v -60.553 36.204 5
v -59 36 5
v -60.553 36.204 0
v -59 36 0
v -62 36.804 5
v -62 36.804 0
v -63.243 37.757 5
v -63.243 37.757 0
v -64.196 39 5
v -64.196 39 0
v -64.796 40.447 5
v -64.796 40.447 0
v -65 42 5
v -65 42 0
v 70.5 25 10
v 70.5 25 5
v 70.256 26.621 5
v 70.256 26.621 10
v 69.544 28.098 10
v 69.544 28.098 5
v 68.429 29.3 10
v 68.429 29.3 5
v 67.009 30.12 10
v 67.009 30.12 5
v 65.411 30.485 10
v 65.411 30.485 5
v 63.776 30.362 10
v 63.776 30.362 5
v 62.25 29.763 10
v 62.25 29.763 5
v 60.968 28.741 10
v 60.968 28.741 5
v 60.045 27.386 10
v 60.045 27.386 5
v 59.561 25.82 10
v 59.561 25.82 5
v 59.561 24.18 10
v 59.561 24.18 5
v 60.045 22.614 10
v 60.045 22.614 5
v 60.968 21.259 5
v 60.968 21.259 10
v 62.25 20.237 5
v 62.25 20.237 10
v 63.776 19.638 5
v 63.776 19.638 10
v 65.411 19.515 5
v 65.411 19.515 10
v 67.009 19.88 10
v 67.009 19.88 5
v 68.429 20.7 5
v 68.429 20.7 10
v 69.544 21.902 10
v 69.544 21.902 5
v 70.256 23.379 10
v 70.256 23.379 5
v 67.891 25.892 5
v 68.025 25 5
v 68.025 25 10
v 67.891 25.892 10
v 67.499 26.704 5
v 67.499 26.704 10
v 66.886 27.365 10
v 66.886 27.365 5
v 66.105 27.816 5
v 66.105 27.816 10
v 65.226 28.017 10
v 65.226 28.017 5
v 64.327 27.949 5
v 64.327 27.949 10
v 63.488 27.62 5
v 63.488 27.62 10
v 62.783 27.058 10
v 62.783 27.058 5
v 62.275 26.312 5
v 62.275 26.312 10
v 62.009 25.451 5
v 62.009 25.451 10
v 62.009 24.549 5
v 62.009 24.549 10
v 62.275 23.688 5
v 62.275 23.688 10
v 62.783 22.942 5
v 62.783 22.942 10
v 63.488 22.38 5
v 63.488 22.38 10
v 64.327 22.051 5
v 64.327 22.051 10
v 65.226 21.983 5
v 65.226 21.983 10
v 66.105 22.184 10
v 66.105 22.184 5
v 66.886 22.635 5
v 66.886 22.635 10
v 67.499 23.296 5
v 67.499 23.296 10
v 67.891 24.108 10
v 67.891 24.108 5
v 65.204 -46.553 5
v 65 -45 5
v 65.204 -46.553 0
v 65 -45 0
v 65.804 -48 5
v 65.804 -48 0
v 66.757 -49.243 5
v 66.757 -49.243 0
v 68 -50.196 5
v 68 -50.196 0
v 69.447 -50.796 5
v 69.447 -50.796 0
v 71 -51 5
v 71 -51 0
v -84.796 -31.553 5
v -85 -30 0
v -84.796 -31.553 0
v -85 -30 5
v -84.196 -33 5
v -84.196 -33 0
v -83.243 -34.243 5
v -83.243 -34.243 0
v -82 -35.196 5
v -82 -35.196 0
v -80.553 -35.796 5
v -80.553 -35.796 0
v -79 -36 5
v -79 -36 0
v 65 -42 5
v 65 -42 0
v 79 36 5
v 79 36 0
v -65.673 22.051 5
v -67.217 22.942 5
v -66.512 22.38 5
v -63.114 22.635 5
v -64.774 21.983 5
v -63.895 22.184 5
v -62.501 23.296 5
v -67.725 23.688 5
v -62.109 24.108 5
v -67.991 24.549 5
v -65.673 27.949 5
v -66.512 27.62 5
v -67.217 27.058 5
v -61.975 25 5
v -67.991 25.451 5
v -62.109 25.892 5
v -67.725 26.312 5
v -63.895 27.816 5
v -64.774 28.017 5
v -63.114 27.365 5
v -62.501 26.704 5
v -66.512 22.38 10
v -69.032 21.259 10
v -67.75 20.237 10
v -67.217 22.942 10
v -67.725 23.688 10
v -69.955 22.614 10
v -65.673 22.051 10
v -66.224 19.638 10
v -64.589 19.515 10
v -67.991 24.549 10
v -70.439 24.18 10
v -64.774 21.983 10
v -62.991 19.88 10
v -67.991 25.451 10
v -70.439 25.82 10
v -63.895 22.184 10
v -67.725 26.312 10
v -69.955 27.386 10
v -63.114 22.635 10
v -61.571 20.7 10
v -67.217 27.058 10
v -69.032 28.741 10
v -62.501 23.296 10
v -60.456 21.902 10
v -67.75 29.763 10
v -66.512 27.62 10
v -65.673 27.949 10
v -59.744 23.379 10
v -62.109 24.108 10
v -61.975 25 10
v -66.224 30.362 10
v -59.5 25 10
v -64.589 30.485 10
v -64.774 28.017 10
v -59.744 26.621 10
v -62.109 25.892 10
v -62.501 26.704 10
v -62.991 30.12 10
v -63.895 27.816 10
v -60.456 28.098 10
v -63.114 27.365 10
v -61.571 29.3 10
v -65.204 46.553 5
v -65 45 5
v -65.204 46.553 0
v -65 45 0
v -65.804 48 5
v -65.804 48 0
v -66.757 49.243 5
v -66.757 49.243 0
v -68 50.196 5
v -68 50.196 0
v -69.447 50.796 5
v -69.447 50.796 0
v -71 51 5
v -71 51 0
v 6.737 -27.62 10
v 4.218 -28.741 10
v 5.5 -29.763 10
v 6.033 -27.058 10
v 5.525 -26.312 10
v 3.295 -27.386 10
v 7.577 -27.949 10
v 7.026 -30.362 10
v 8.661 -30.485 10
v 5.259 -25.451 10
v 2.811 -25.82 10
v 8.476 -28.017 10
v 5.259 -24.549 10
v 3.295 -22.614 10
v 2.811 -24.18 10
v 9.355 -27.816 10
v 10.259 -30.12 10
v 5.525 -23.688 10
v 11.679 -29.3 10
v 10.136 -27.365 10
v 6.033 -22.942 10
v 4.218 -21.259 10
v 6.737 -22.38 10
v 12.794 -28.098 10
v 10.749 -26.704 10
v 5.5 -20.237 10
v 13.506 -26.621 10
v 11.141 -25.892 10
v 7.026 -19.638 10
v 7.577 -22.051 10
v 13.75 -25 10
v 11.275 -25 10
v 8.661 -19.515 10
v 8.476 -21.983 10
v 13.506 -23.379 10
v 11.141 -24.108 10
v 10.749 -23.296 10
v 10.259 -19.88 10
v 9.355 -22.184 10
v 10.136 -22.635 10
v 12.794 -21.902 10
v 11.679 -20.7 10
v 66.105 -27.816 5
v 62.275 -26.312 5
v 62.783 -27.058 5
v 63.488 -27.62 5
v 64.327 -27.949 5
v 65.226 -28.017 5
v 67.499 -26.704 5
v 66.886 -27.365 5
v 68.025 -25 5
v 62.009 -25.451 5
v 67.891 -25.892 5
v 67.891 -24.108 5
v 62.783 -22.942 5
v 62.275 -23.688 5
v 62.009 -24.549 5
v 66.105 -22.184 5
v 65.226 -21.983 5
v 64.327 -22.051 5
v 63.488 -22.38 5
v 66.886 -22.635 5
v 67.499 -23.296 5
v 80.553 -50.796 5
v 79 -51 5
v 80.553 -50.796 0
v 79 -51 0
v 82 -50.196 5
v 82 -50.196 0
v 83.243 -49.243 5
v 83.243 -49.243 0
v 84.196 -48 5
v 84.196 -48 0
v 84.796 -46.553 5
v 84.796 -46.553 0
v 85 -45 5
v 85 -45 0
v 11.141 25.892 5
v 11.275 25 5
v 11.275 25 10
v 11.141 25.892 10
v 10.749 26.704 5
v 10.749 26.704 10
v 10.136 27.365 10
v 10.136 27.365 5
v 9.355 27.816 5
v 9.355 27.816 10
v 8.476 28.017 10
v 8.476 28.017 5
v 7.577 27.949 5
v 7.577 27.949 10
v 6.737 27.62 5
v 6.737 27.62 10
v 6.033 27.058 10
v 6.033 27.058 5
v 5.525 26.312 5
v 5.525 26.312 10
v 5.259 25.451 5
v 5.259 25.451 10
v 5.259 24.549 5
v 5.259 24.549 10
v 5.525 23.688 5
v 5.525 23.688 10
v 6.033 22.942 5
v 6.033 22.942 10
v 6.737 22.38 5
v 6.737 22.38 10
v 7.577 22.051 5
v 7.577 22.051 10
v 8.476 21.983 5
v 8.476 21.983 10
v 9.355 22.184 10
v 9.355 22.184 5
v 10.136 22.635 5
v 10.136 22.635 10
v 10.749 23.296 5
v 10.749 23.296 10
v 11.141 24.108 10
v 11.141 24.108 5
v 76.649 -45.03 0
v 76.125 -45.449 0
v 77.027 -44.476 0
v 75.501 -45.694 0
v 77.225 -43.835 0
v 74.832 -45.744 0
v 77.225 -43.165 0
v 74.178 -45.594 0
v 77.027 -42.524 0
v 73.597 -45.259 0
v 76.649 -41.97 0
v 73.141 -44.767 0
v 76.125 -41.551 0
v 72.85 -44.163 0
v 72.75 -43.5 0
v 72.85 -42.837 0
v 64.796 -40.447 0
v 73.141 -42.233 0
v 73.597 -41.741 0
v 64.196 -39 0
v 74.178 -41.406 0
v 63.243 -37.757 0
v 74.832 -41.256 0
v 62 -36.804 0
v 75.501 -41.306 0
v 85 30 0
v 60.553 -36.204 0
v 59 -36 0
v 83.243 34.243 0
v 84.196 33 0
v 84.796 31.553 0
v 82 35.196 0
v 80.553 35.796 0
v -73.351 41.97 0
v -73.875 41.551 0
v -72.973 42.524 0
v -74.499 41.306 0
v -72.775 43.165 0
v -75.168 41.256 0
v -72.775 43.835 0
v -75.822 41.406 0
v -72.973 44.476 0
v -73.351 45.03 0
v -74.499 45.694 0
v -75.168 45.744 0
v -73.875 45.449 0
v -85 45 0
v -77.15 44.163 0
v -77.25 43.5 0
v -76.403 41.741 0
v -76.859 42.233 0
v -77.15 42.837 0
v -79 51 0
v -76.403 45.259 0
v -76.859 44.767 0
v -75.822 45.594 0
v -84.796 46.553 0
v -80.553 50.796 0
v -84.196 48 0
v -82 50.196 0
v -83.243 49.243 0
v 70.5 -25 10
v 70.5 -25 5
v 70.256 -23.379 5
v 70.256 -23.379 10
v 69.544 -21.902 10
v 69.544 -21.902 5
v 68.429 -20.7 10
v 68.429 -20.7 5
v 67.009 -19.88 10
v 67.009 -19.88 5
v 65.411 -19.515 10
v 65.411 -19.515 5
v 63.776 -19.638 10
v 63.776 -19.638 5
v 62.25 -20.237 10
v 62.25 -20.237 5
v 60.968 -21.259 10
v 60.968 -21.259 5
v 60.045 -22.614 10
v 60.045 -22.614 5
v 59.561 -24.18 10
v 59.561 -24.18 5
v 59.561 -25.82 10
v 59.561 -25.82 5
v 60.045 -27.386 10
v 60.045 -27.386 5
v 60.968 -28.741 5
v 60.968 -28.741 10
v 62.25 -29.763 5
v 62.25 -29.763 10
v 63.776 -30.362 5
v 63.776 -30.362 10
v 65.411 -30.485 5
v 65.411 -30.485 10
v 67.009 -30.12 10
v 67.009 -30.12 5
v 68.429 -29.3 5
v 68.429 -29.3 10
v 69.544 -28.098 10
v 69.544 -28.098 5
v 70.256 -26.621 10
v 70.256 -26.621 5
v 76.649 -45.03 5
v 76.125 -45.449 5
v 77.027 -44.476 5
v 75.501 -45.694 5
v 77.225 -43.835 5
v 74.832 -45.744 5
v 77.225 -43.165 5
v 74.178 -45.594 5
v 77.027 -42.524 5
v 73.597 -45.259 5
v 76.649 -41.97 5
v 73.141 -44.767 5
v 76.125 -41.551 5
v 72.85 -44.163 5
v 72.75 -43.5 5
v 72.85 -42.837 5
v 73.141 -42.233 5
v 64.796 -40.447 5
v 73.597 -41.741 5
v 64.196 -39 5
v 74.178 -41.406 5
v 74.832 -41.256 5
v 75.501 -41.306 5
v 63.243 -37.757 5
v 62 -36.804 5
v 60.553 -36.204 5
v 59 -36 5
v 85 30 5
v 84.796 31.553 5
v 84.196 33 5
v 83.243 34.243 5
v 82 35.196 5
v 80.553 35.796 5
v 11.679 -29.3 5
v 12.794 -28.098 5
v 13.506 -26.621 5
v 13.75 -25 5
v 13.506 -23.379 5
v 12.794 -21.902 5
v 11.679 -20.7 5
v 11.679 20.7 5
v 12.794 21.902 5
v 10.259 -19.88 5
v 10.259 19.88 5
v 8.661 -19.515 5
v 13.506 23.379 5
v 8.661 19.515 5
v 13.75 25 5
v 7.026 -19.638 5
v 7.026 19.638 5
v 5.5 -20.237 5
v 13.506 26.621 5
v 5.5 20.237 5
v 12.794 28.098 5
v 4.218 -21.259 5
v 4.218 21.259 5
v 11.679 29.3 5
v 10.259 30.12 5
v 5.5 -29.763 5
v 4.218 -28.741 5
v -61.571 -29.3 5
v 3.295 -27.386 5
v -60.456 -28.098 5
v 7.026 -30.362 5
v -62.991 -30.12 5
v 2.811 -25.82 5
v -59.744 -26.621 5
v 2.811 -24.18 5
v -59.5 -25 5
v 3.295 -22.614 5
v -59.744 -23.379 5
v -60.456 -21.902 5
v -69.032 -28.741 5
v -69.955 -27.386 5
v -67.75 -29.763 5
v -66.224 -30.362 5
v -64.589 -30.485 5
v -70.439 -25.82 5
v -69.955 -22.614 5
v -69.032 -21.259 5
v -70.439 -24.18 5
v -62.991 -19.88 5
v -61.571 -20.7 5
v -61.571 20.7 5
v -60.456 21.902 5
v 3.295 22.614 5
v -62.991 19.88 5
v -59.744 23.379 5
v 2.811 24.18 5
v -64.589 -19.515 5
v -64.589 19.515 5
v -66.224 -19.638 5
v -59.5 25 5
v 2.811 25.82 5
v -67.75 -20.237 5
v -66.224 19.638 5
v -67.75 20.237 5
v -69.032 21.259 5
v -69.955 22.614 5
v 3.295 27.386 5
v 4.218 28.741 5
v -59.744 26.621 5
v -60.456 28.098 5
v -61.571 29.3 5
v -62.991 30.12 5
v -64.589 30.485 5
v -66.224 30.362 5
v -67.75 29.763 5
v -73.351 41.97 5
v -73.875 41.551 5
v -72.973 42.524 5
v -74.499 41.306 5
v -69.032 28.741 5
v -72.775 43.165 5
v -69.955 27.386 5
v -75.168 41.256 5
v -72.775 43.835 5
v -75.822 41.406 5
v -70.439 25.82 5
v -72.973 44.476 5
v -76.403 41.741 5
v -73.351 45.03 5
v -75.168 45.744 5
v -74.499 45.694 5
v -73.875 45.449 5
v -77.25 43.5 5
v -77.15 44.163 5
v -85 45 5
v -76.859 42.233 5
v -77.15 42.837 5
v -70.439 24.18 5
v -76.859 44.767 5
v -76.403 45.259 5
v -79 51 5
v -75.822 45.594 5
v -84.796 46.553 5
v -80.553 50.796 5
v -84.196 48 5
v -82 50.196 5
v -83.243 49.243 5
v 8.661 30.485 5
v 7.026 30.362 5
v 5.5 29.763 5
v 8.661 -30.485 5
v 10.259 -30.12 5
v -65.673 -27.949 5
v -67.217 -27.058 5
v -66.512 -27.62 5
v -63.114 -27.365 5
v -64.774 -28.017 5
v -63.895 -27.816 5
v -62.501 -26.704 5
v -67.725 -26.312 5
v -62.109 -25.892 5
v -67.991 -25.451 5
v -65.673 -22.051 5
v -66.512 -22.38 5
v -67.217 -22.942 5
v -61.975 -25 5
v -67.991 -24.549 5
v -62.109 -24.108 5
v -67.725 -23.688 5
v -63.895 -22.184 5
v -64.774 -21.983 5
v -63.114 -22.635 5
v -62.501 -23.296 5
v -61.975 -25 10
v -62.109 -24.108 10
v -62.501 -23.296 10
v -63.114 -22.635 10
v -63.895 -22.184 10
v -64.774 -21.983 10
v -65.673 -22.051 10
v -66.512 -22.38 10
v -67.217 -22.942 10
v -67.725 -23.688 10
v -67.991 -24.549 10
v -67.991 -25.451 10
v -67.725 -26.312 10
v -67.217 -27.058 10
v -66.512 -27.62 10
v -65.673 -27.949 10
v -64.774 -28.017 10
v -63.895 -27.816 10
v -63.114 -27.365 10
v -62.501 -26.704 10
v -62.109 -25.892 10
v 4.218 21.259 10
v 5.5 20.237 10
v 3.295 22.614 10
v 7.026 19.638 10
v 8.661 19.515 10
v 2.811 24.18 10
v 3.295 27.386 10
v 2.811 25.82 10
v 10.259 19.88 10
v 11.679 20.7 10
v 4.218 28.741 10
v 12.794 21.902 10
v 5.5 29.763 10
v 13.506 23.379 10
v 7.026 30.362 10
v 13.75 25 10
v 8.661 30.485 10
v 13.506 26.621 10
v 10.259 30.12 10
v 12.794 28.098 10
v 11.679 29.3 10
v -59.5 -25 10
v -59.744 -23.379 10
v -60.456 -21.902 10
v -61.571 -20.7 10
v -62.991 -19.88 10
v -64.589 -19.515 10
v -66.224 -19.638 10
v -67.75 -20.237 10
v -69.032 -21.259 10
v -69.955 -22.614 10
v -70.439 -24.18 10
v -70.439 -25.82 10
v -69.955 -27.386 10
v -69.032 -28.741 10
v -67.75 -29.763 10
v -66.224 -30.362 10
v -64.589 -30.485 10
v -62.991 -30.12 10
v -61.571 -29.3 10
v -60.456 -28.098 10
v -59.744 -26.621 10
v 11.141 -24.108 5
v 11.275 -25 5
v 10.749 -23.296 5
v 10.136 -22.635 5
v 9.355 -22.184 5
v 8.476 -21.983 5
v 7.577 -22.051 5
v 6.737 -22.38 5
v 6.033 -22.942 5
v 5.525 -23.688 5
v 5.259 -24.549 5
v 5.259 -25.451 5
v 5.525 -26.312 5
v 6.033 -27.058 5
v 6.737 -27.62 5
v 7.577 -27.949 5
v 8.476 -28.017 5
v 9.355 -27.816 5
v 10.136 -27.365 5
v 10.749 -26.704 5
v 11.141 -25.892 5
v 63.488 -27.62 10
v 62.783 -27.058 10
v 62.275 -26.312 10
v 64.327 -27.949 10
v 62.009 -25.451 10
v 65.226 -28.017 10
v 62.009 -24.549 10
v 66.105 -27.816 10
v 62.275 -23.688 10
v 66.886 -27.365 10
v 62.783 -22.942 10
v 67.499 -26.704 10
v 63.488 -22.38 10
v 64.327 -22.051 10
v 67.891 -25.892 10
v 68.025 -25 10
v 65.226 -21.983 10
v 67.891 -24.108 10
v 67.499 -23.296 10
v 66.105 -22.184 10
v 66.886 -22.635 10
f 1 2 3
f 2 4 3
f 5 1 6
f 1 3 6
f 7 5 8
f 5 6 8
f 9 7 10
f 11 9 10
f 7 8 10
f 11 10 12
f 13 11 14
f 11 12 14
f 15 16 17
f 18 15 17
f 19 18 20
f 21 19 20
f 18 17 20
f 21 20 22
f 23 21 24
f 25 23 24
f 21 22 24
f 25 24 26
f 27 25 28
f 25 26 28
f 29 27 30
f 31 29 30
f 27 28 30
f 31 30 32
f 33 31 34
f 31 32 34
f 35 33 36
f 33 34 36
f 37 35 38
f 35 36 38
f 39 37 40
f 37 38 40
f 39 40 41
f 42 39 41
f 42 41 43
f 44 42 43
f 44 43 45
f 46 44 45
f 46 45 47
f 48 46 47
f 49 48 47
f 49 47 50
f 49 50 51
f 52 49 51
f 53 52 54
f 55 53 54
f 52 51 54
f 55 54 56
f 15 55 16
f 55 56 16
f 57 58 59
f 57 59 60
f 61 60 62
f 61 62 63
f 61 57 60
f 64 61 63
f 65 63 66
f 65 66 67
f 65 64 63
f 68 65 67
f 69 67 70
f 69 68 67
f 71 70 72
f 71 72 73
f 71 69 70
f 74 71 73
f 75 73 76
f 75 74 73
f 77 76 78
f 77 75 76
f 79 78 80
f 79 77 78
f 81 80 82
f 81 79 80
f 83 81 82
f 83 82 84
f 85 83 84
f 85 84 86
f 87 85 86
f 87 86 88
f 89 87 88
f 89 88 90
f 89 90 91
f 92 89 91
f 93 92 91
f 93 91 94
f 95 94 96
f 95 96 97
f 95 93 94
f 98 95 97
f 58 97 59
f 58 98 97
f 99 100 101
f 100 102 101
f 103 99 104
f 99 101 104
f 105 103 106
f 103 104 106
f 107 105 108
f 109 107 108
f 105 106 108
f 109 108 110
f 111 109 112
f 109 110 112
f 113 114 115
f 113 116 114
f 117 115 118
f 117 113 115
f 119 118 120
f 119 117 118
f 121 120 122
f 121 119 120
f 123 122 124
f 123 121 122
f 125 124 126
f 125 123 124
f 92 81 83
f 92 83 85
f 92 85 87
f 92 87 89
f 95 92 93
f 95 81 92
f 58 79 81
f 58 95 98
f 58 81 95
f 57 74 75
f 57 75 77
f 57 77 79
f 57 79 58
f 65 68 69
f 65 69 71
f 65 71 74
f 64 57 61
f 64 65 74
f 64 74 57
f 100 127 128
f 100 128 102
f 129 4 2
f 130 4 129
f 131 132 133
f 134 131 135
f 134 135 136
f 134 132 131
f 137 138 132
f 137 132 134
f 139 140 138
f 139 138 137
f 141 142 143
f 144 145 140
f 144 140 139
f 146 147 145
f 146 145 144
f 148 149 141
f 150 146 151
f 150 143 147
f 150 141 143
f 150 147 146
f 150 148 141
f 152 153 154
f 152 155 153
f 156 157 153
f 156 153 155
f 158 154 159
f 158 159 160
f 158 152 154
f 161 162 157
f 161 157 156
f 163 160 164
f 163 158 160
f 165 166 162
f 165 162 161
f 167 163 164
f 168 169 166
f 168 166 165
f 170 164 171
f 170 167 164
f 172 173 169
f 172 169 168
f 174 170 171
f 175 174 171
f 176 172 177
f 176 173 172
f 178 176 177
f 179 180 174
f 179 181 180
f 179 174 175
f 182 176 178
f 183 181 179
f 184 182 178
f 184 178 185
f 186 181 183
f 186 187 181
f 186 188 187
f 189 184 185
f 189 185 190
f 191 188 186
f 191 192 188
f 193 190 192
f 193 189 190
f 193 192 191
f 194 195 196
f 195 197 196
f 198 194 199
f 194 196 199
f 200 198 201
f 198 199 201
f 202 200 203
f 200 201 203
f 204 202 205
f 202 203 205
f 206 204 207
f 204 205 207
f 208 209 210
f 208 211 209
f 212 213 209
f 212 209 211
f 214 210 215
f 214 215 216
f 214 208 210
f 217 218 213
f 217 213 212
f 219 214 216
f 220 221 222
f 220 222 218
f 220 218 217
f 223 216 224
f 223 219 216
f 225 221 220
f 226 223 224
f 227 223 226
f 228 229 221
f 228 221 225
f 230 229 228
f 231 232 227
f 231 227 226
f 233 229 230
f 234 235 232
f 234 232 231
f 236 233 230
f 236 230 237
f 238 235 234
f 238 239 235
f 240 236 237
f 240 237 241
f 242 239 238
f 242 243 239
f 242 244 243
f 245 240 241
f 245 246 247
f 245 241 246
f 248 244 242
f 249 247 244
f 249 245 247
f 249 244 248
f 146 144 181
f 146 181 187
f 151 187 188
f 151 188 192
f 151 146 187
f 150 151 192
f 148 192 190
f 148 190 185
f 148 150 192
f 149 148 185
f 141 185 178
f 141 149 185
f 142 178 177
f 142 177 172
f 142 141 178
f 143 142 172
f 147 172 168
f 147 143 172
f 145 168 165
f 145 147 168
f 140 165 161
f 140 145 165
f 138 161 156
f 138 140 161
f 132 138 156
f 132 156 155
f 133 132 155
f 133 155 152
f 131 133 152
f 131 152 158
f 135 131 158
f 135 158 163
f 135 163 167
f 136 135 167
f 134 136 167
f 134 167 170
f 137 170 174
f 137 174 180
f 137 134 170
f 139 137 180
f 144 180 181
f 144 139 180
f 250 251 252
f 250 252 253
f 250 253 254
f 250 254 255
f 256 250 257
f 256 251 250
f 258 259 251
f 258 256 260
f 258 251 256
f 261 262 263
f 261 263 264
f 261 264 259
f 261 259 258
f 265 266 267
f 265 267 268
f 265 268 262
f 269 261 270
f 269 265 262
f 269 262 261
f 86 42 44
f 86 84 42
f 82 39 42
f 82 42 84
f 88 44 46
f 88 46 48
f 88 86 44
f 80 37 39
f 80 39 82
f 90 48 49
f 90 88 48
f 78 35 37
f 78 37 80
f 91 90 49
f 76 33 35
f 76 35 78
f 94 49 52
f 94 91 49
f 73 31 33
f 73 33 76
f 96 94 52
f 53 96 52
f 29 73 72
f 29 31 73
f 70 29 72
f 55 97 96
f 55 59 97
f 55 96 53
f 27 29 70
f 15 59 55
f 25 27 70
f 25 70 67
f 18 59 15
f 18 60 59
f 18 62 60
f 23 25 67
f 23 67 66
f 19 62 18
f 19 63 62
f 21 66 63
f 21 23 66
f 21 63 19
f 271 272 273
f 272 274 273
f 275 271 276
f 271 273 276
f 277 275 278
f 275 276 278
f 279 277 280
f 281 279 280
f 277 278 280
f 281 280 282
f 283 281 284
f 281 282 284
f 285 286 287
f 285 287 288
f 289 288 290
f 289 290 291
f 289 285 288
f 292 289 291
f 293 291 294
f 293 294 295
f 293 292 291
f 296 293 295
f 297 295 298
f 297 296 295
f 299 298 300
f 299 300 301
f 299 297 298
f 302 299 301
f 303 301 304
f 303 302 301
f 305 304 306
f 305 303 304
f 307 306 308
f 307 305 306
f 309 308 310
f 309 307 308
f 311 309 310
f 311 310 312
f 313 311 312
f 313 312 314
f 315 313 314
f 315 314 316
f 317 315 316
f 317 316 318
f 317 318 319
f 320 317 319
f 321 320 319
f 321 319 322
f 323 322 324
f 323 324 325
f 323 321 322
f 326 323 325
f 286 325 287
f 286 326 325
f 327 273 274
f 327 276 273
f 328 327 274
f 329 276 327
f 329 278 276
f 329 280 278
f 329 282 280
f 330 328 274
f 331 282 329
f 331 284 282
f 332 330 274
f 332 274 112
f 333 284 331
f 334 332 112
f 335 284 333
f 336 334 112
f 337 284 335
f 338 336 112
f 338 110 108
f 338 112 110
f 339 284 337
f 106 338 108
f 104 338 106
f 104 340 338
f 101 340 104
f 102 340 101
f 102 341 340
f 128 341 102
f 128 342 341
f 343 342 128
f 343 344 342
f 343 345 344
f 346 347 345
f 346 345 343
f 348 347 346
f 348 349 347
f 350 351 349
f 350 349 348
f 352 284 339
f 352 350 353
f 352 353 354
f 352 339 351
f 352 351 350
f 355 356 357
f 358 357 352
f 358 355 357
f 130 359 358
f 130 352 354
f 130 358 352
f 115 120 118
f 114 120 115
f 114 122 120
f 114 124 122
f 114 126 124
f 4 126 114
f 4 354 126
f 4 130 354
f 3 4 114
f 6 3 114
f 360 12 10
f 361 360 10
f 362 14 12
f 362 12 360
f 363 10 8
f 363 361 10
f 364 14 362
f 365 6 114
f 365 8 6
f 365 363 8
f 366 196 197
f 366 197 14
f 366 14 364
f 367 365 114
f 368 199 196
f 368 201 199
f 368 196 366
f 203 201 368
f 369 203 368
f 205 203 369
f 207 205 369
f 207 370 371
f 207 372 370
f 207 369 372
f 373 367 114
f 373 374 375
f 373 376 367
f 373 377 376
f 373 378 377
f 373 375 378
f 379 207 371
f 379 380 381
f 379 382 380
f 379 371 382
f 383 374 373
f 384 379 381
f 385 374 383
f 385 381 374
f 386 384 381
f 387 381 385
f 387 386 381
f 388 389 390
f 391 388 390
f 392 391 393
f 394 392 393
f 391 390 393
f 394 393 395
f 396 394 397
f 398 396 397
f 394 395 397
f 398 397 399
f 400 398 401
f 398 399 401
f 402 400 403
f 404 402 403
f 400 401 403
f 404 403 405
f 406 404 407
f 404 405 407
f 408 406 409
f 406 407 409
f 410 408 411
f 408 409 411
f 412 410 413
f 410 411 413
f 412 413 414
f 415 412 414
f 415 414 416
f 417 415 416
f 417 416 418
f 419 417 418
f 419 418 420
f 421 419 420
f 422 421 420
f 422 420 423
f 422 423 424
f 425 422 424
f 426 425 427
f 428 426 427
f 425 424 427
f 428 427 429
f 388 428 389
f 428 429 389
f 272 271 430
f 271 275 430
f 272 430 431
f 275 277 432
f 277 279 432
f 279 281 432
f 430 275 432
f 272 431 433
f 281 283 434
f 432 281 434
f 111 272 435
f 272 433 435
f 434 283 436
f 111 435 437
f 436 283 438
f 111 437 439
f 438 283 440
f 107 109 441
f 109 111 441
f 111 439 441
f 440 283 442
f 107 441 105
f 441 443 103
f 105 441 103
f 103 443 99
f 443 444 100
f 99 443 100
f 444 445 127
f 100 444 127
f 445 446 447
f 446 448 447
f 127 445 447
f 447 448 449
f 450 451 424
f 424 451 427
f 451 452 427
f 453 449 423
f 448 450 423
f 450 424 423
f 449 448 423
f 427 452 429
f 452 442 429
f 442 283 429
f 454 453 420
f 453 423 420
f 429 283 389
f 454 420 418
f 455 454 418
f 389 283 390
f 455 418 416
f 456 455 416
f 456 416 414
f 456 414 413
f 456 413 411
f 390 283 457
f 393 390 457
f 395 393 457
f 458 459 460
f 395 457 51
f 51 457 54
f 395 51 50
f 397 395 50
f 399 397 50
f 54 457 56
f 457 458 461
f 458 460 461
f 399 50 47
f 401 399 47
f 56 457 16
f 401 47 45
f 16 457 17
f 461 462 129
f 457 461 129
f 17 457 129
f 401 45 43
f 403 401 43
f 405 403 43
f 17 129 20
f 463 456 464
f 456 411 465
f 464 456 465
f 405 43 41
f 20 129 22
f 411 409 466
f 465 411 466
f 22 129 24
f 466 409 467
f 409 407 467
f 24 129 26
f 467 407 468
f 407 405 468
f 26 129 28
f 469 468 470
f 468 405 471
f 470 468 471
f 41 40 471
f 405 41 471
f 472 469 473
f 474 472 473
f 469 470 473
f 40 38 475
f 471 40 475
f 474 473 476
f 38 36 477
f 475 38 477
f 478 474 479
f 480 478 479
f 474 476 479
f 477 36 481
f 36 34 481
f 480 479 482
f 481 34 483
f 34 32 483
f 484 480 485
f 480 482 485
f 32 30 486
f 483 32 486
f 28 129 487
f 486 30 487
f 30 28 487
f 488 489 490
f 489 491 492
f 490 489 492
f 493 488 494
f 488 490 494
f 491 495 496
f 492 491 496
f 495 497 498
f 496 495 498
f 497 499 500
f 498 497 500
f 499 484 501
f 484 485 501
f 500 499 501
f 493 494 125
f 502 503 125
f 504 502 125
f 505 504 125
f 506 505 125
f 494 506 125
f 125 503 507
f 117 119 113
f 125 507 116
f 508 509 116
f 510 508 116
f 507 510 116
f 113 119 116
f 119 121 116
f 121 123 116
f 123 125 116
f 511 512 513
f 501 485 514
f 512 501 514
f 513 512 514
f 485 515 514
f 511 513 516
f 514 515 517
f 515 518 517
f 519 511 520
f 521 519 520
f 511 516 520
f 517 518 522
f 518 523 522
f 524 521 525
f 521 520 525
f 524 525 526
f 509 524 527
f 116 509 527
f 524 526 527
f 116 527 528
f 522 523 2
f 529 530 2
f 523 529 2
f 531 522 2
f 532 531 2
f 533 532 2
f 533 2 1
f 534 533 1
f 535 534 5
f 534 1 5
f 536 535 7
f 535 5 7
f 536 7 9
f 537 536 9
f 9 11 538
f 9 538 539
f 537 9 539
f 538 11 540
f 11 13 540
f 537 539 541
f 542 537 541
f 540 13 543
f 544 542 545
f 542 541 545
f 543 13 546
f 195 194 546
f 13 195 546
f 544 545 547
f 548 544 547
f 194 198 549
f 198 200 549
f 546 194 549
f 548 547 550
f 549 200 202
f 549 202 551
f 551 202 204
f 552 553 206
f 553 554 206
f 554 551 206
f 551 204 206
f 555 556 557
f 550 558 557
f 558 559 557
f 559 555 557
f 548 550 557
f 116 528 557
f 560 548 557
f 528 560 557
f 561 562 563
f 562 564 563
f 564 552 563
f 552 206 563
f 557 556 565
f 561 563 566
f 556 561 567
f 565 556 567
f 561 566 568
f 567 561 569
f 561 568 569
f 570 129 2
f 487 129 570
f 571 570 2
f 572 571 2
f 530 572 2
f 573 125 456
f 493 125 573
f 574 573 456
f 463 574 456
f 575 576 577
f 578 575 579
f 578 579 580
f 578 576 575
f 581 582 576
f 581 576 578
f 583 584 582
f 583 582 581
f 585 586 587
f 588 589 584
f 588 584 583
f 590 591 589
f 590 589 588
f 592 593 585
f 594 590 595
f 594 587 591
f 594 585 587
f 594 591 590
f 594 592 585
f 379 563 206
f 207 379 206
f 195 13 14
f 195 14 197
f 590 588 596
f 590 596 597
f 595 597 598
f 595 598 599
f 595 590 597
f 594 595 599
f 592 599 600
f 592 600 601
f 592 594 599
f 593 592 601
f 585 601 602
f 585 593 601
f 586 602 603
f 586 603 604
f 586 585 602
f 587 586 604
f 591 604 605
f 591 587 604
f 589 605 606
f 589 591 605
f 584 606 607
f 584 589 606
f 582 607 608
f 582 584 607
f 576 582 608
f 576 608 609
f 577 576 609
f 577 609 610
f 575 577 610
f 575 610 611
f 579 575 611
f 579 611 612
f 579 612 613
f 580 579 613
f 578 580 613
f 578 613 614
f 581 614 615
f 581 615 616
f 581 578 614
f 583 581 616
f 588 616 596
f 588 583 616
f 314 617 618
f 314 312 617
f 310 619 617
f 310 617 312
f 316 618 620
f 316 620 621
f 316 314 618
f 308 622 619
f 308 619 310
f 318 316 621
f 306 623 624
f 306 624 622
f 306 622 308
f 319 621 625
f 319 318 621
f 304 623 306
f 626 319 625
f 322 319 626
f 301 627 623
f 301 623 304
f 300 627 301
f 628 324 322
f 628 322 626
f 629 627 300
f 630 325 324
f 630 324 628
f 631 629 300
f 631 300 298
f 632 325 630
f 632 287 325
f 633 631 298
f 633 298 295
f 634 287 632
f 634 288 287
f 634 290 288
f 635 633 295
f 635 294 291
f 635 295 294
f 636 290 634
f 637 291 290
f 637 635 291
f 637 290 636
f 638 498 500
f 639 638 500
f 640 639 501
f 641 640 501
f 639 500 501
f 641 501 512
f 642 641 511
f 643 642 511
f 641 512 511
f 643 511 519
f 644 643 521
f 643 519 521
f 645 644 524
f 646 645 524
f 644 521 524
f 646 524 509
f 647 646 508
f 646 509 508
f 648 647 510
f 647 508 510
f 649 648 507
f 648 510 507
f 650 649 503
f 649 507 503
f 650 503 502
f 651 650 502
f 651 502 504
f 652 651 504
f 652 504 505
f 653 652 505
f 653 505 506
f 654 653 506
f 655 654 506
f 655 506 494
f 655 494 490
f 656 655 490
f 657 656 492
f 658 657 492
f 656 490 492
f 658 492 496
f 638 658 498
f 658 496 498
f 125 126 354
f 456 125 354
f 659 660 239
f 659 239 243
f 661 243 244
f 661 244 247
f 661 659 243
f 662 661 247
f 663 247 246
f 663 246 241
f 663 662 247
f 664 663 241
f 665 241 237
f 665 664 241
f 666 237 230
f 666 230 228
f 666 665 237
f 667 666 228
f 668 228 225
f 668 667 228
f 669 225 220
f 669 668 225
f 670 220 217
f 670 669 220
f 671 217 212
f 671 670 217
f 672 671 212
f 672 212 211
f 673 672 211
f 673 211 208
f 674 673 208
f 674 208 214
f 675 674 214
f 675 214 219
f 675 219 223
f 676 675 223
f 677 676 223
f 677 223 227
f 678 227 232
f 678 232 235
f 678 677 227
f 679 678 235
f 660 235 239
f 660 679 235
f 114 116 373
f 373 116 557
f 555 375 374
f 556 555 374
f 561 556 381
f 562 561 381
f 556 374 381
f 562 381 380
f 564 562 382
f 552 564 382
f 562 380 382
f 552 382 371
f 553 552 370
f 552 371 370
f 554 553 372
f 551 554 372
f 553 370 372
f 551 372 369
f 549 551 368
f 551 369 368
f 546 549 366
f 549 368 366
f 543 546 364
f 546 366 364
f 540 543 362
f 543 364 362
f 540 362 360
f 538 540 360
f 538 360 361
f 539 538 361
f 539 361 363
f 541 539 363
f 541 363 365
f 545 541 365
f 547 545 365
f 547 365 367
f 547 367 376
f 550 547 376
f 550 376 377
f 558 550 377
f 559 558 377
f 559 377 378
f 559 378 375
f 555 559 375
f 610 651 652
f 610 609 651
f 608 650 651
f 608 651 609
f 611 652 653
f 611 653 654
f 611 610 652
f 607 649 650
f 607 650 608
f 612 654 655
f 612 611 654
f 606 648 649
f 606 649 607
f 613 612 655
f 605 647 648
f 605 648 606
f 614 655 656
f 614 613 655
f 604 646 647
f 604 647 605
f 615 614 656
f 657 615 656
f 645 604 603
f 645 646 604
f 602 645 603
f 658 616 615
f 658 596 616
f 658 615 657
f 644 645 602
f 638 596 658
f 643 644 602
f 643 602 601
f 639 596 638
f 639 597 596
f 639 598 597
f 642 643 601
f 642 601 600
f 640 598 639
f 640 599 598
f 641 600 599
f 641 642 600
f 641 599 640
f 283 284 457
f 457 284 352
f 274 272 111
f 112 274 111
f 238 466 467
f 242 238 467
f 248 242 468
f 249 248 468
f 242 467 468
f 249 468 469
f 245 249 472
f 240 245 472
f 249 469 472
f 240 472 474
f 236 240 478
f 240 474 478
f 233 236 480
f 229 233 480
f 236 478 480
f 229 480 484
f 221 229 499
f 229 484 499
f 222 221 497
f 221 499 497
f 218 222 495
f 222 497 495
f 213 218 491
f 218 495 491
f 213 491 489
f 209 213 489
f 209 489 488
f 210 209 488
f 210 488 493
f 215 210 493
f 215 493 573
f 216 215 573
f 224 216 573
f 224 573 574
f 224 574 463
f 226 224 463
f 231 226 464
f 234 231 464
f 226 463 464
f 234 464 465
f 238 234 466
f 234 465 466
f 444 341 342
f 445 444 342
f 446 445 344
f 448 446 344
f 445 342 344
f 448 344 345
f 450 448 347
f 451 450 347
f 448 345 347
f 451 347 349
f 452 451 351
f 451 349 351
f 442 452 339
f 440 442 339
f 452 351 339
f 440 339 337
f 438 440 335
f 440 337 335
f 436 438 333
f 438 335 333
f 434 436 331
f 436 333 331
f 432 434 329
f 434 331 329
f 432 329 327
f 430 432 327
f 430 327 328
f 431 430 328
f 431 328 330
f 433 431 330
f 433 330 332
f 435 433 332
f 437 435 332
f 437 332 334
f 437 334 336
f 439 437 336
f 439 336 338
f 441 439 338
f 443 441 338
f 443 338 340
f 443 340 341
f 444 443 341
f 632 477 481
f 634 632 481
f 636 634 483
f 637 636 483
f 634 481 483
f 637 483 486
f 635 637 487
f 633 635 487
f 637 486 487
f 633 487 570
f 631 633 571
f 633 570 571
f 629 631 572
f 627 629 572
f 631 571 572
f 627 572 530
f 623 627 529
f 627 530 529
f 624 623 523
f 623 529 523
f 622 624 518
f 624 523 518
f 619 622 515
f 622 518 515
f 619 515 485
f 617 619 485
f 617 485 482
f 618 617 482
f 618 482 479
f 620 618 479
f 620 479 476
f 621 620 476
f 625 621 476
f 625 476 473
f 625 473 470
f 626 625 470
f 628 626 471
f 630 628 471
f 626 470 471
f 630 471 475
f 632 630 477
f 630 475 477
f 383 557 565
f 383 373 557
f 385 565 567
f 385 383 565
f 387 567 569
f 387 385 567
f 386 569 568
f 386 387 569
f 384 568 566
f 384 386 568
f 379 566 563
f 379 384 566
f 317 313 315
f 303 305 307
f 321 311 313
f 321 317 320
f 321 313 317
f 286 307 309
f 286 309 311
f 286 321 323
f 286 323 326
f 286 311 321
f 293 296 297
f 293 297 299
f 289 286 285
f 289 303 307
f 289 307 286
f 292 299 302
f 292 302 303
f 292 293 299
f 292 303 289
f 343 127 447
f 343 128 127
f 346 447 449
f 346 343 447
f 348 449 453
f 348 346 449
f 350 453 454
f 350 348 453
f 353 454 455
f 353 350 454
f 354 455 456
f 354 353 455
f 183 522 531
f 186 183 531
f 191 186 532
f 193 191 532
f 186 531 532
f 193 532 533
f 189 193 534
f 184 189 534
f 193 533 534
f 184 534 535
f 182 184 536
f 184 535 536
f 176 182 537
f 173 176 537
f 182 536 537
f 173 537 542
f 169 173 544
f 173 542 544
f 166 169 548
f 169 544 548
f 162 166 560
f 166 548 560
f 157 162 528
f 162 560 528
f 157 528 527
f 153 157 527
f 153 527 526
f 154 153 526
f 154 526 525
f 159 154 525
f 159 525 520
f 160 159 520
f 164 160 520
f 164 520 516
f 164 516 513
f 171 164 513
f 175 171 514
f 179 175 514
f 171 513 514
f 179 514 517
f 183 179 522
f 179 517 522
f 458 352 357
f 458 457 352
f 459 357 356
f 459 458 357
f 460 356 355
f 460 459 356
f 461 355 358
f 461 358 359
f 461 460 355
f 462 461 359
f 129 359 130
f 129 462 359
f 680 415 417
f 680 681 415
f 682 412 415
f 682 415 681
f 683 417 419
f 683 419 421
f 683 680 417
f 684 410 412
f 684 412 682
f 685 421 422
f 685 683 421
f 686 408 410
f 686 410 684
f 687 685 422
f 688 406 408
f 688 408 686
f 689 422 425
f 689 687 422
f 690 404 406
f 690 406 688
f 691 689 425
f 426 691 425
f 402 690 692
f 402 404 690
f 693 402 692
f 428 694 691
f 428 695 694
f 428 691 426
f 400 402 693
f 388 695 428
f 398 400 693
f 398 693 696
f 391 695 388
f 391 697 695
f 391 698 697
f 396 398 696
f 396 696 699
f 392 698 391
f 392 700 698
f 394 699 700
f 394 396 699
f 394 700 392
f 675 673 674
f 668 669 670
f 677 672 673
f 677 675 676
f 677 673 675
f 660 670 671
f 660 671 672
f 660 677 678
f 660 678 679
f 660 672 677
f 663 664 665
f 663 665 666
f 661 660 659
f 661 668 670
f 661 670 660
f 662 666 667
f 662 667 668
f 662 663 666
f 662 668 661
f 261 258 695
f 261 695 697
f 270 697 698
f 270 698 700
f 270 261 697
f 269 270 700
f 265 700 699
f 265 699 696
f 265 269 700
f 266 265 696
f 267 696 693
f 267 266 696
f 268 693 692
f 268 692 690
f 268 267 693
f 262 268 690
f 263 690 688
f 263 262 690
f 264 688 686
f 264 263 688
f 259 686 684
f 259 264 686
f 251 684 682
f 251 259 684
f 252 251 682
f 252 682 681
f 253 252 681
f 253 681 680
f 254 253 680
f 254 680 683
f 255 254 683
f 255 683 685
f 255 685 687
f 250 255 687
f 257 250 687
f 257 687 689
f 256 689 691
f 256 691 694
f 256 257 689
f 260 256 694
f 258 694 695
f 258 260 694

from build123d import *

# Parameters (mm, degrees)
SKETCH1_W            = 170
SKETCH1_H            = 72
BOSS_EXTRUDE1_DEPTH  = 5
SKETCH2_R            = 5.5
SKETCH2_R_2          = 3.025
BOSS_EXTRUDE2_DEPTH  = 5
BOSS_EXTRUDE3_DEPTH  = 5
FILLET1_R            = 6
M4_CLEARANCE_HOLE1_D = 4.5


with BuildPart() as part:
    # Sketch1 → Boss-Extrude1 (new body)
    with BuildSketch(Plane.XY):
        Rectangle(SKETCH1_W, SKETCH1_H)
    extrude(amount=BOSS_EXTRUDE1_DEPTH)

    # Sketch2 → Boss-Extrude2 (add)
    # profile 1 of 6: a face of its own
    with BuildSketch(Plane.XY.offset(5)):
        with Locations((65, 25)):
            Circle(SKETCH2_R)
        with Locations((65, 25)):
            Circle(SKETCH2_R_2, mode=Mode.SUBTRACT)
    # profile 2 of 6: a face of its own
    with BuildSketch(Plane.XY.offset(5)):
        with Locations((8.25, 25)):
            Circle(SKETCH2_R)
        with Locations((8.25, 25)):
            Circle(SKETCH2_R_2, mode=Mode.SUBTRACT)
    # profile 3 of 6: a face of its own
    with BuildSketch(Plane.XY.offset(5)):
        with Locations((-65, 25)):
            Circle(SKETCH2_R)
        with Locations((-65, 25)):
            Circle(SKETCH2_R_2, mode=Mode.SUBTRACT)
    # profile 4 of 6: a face of its own
    with BuildSketch(Plane.XY.offset(5)):
        with Locations((-65, -25)):
            Circle(SKETCH2_R)
        with Locations((-65, -25)):
            Circle(SKETCH2_R_2, mode=Mode.SUBTRACT)
    # profile 5 of 6: a face of its own
    with BuildSketch(Plane.XY.offset(5)):
        with Locations((8.25, -25)):
            Circle(SKETCH2_R)
        with Locations((8.25, -25)):
            Circle(SKETCH2_R_2, mode=Mode.SUBTRACT)
    # profile 6 of 6: a face of its own
    with BuildSketch(Plane.XY.offset(5)):
        with Locations((65, -25)):
            Circle(SKETCH2_R)
        with Locations((65, -25)):
            Circle(SKETCH2_R_2, mode=Mode.SUBTRACT)
    extrude(amount=BOSS_EXTRUDE2_DEPTH)

    # Sketch3 → Boss-Extrude3 (add)
    with BuildSketch(Plane.XY.offset(5)):
        Polygon((-65, 51), (-85, 36), (-85, 51), align=None)
        Polygon((-65, 51), (-85, 36), (-65, 36), align=None)
        Polygon((65, -51), (85, -36), (65, -36), align=None)
        Polygon((85, -36), (85, -51), (65, -51), align=None)
    extrude(amount=-BOSS_EXTRUDE3_DEPTH)

    # Fillet1
    fillet1_edges = [part.edges().sort_by_distance(p)[0] for p in [
        (-85, 51, 2.5),
        (-65, 51, 2.5),
        (-65, 36, 2.5),
        (65, -51, 2.5),
        (65, -36, 2.5),
        (85, -51, 2.5),
        (-85, -36, 2.5),
        (85, 36, 2.5),
    ]]
    fillet(fillet1_edges, radius=FILLET1_R)

    # M4 Clearance Hole1 (through all)
    with Locations(Plane.XY.offset(5)):
        with Locations((-75, 43.5), (75, -43.5)):
            Hole(M4_CLEARANCE_HOLE1_D / 2)


solid = part.part
